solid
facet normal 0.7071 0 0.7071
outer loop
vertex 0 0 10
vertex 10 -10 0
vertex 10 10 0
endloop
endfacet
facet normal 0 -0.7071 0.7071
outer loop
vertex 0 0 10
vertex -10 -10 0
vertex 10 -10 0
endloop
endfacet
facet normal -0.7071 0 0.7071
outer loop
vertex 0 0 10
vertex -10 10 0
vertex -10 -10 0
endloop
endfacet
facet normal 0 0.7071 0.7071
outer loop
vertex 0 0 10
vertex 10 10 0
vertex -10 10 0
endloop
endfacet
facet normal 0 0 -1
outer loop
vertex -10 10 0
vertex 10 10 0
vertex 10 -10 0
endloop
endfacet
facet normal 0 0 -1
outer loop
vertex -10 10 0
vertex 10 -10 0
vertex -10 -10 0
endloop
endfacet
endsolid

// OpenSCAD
polyhedron(
  points=[ [10,10,0],[10,-10,0],[-10,-10,0],[-10,10,0], // the four points at base
           [0,0,10]  ],                                 // the apex point 
  triangles=[ [0,1,4],[1,2,4],[2,3,4],[3,0,4],          // each triangle side
              [1,0,3],[2,1,3] ]                         // two triangles for square base
 );
